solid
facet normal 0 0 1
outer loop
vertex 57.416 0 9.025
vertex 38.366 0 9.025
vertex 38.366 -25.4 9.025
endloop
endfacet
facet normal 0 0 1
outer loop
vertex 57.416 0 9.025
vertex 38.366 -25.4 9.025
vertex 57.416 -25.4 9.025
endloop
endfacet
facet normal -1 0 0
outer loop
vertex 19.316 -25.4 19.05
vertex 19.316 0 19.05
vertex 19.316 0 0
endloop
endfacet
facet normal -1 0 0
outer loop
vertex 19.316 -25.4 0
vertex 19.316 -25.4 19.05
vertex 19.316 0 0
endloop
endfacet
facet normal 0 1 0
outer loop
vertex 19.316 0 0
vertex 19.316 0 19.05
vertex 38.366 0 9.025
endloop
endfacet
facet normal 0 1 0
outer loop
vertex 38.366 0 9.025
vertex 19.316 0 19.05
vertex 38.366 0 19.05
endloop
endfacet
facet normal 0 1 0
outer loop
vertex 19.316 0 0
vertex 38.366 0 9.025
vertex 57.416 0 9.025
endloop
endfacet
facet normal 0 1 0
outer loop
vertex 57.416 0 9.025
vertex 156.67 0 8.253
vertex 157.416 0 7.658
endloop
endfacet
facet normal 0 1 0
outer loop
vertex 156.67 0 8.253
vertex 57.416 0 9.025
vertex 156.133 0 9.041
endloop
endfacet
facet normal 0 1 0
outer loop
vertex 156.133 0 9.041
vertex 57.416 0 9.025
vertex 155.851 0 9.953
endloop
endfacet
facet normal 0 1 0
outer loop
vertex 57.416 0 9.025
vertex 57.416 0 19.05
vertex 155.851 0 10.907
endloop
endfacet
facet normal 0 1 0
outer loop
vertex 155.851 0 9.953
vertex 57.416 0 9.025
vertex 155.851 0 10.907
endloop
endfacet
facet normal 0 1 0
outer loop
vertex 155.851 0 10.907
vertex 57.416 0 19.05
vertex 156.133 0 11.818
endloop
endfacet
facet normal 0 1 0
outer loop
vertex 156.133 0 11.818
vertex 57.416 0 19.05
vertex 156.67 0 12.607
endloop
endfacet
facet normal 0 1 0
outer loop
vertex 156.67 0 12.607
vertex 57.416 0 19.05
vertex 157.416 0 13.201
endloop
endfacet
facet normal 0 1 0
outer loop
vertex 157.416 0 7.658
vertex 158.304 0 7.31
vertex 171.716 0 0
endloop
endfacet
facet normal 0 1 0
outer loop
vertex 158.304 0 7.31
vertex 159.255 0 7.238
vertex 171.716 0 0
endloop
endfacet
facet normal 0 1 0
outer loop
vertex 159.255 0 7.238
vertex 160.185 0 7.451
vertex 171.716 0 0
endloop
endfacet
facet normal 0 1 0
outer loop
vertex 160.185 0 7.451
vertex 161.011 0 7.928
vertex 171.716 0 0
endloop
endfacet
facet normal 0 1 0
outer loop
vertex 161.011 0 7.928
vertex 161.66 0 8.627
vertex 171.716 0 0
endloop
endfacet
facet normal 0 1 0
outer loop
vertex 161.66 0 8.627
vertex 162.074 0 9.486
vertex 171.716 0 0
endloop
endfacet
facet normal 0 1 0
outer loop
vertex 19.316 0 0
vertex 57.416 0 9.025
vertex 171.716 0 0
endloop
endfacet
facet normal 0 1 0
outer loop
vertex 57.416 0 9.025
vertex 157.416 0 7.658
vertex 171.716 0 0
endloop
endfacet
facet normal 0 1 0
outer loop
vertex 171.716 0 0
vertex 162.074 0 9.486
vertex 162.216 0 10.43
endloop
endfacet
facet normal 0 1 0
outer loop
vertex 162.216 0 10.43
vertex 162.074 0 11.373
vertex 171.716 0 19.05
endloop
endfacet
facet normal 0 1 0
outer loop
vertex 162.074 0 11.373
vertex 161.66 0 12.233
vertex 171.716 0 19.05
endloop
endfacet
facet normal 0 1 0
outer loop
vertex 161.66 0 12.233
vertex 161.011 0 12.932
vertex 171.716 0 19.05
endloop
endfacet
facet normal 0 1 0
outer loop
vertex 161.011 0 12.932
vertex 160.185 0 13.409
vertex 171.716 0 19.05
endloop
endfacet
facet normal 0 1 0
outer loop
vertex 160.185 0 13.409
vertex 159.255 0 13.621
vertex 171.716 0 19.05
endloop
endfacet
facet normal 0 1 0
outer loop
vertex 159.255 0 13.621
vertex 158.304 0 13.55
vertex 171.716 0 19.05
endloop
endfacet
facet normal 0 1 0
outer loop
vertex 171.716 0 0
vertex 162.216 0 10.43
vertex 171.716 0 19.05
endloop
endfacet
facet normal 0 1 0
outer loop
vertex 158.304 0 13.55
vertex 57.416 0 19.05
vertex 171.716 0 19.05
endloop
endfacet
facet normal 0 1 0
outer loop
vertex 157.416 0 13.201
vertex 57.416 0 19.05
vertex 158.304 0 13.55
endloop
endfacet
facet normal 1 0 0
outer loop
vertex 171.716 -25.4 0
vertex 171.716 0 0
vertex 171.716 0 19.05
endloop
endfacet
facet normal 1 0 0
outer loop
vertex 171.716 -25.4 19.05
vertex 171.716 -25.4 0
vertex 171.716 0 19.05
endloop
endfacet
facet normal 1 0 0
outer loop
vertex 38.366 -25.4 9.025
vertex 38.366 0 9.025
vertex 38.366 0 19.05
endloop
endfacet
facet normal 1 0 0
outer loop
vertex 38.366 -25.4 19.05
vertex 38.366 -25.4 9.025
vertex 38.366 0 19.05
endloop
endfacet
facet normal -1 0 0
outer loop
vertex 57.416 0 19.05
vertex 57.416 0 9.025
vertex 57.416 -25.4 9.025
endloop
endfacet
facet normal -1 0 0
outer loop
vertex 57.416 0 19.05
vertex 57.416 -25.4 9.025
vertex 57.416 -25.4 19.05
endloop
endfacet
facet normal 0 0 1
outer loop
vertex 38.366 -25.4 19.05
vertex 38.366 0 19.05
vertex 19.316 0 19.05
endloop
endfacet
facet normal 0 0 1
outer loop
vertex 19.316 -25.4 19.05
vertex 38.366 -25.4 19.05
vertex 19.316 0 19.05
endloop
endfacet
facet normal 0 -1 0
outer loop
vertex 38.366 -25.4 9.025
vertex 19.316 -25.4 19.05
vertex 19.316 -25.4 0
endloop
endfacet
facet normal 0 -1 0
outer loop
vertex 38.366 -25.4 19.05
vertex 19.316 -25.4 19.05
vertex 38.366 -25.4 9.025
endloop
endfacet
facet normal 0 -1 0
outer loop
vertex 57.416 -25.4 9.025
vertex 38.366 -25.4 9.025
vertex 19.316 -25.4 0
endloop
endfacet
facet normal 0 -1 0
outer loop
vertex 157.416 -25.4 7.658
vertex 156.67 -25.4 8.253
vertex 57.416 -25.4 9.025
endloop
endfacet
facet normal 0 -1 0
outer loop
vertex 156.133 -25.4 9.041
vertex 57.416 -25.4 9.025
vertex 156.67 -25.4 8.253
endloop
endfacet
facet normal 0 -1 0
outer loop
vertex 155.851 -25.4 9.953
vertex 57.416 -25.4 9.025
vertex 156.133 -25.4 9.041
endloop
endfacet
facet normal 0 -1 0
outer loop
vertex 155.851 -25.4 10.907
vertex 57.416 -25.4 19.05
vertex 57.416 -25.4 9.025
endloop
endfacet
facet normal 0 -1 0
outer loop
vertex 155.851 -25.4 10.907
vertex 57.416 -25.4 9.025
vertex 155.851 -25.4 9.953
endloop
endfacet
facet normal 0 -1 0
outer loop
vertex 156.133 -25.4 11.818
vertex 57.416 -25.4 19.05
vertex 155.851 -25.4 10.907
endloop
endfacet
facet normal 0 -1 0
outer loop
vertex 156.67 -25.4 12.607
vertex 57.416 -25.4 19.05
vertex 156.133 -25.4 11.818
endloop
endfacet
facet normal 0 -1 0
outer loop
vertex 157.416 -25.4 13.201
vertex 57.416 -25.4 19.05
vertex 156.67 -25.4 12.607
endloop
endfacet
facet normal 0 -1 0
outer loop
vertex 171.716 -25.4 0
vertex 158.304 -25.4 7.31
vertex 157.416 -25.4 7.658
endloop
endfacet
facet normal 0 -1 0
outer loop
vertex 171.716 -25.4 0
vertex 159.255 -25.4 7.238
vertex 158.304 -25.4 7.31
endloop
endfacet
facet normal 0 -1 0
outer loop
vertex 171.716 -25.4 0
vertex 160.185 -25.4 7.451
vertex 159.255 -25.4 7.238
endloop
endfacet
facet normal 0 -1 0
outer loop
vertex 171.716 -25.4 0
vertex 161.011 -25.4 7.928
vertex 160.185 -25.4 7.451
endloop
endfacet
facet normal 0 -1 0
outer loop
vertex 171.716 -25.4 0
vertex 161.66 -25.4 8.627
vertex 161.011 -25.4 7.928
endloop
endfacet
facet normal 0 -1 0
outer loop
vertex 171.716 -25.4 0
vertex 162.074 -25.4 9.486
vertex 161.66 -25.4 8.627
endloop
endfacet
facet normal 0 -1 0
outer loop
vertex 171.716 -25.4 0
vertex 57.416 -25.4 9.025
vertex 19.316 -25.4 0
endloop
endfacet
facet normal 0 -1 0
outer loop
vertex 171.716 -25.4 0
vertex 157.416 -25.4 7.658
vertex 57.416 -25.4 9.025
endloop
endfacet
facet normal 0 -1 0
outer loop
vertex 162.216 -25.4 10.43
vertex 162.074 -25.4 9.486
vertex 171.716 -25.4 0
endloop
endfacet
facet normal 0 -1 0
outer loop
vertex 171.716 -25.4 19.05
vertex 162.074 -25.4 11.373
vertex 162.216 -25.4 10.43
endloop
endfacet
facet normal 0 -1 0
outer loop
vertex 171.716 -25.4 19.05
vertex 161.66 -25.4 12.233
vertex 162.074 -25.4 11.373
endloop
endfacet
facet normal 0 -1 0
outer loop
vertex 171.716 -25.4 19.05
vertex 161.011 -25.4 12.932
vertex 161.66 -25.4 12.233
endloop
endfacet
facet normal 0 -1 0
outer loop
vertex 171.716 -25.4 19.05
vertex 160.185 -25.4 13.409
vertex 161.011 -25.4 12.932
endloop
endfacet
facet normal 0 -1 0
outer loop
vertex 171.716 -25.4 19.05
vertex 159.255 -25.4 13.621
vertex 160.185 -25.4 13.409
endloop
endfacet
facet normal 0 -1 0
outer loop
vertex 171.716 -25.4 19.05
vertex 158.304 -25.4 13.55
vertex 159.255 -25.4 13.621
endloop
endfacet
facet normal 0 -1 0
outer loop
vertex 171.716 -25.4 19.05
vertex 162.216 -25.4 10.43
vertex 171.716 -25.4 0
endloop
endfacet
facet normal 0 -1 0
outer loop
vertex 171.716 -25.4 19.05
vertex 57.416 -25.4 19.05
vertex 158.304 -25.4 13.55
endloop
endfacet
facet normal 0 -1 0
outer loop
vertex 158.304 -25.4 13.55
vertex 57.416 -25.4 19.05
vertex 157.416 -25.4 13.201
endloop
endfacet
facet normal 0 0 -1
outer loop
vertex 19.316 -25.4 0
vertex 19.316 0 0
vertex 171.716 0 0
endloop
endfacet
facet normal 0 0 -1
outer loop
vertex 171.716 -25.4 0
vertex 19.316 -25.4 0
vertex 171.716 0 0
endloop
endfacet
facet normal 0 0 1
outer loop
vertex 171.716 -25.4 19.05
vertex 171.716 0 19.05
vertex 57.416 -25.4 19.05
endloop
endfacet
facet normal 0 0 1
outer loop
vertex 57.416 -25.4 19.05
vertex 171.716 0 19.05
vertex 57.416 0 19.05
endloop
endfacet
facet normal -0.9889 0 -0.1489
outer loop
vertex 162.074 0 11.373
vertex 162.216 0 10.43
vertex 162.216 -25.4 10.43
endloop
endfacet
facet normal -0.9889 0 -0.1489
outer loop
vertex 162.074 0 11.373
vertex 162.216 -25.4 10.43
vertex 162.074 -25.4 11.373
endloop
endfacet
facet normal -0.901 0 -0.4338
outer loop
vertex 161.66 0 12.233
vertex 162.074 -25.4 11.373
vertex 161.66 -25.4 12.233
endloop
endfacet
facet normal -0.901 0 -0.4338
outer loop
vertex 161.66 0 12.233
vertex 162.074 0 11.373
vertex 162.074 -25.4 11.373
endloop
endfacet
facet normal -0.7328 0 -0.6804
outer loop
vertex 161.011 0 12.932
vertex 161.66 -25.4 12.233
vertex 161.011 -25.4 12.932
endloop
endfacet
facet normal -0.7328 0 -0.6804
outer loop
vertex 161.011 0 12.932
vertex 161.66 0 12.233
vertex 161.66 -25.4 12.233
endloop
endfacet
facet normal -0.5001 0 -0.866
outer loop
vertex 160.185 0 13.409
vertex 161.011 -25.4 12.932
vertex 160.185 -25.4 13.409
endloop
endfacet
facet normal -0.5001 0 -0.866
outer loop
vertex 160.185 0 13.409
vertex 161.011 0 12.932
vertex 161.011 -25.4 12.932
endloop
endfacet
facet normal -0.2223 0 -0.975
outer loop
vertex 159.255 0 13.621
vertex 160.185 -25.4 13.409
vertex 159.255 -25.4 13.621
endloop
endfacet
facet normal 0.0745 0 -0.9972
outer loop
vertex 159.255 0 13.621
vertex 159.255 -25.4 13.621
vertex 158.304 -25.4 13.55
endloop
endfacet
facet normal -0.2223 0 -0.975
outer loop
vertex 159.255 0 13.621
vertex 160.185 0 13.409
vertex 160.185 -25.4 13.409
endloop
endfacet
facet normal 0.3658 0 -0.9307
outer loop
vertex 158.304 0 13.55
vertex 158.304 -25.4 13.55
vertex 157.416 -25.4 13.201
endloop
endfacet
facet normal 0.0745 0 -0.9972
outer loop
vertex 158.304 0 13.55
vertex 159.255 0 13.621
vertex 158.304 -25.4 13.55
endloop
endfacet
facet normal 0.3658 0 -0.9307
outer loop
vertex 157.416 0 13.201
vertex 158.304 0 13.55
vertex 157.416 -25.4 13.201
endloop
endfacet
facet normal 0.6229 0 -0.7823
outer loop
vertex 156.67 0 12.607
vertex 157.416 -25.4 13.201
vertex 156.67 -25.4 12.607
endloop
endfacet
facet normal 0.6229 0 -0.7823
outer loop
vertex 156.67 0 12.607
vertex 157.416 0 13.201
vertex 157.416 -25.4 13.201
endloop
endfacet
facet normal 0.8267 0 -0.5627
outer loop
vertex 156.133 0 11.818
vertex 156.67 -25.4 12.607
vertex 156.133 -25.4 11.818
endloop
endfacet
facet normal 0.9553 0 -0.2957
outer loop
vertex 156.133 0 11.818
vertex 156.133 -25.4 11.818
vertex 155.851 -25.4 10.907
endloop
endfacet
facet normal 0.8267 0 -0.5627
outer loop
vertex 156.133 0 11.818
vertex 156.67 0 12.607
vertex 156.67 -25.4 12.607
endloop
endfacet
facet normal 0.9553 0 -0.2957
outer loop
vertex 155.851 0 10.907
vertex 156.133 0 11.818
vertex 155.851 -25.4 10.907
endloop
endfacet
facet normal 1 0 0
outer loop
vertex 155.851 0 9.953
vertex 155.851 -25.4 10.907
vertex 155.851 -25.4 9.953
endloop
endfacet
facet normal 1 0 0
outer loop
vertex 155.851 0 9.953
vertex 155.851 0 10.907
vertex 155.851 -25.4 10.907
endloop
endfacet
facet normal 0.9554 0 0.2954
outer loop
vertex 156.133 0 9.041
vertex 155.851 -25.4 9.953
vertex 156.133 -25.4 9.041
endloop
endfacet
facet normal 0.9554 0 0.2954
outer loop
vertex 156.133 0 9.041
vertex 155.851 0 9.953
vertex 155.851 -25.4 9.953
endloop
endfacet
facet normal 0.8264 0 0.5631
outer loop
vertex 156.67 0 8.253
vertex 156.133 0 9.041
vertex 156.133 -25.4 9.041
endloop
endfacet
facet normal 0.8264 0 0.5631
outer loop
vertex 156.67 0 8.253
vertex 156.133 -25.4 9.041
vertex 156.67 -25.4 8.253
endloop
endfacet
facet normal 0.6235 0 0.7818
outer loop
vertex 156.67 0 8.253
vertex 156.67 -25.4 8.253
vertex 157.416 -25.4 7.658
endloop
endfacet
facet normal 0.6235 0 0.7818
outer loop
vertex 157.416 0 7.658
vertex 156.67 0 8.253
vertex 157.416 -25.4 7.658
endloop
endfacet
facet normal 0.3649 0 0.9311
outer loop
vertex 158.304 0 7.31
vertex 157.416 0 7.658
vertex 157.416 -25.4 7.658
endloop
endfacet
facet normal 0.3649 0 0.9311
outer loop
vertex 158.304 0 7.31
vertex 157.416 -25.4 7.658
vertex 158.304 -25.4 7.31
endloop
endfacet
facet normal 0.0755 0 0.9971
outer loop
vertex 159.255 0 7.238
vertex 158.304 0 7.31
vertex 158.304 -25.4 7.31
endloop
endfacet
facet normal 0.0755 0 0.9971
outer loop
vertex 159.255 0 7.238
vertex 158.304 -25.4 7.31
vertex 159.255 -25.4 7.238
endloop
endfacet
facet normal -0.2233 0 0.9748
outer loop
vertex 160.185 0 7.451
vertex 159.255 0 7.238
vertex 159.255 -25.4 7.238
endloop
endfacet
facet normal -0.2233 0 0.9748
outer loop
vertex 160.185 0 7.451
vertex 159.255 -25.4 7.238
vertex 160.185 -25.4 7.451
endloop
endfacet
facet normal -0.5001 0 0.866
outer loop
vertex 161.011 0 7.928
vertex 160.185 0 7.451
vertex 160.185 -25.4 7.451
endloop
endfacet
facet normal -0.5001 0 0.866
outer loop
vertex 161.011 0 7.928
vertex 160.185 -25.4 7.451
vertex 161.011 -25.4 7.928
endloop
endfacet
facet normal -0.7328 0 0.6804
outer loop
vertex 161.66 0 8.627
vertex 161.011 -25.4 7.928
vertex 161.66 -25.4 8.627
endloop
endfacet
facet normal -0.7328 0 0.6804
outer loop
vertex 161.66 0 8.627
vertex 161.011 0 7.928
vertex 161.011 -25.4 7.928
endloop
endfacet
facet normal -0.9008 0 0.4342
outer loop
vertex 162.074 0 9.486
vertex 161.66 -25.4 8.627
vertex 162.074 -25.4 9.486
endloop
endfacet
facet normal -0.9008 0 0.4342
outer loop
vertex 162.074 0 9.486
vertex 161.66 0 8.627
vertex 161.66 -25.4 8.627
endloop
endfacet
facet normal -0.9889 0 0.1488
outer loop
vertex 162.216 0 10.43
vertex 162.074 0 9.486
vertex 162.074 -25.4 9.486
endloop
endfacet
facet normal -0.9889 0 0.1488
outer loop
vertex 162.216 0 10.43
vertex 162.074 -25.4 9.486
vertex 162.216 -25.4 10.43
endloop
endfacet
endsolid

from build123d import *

# Parameters (mm, degrees)
F0_W     = 19.05
F0_H     = 10.024884
F0_R     = 3.2004
F1_DEPTH = 25.4
F2_DEPTH = 19.05
F3_DEPTH = 25.4


with BuildPart() as f1:
    # F0 (on Front) → F1 (new body)
    with BuildSketch(Plane.XZ):
        with Locations((47.891052, 14.037558)):
            Rectangle(F0_W, F0_H)
        Polygon((19.316052, 0), (171.716052, 0), (171.716052, 19.05), (57.416052, 19.05), (57.416052, 9.025116), (38.366052, 9.025116), (38.366052, 19.05), (19.316052, 19.05), align=None)
        with Locations((159.016052, 10.429697)):
            Circle(F0_R, mode=Mode.SUBTRACT)
    extrude(amount=F1_DEPTH)

    # F0 (on Front) → F2 (join)
    with BuildSketch(Plane.XZ):
        with Locations((47.891052, 14.037558)):
            Rectangle(F0_W, F0_H)
    extrude(amount=F2_DEPTH)

    # F0 (on Front) → F3 (cut)
    with BuildSketch(Plane.XZ):
        with Locations((47.891052, 14.037558)):
            Rectangle(F0_W, F0_H)
    extrude(amount=F3_DEPTH, mode=Mode.SUBTRACT)


solid = f1.part
